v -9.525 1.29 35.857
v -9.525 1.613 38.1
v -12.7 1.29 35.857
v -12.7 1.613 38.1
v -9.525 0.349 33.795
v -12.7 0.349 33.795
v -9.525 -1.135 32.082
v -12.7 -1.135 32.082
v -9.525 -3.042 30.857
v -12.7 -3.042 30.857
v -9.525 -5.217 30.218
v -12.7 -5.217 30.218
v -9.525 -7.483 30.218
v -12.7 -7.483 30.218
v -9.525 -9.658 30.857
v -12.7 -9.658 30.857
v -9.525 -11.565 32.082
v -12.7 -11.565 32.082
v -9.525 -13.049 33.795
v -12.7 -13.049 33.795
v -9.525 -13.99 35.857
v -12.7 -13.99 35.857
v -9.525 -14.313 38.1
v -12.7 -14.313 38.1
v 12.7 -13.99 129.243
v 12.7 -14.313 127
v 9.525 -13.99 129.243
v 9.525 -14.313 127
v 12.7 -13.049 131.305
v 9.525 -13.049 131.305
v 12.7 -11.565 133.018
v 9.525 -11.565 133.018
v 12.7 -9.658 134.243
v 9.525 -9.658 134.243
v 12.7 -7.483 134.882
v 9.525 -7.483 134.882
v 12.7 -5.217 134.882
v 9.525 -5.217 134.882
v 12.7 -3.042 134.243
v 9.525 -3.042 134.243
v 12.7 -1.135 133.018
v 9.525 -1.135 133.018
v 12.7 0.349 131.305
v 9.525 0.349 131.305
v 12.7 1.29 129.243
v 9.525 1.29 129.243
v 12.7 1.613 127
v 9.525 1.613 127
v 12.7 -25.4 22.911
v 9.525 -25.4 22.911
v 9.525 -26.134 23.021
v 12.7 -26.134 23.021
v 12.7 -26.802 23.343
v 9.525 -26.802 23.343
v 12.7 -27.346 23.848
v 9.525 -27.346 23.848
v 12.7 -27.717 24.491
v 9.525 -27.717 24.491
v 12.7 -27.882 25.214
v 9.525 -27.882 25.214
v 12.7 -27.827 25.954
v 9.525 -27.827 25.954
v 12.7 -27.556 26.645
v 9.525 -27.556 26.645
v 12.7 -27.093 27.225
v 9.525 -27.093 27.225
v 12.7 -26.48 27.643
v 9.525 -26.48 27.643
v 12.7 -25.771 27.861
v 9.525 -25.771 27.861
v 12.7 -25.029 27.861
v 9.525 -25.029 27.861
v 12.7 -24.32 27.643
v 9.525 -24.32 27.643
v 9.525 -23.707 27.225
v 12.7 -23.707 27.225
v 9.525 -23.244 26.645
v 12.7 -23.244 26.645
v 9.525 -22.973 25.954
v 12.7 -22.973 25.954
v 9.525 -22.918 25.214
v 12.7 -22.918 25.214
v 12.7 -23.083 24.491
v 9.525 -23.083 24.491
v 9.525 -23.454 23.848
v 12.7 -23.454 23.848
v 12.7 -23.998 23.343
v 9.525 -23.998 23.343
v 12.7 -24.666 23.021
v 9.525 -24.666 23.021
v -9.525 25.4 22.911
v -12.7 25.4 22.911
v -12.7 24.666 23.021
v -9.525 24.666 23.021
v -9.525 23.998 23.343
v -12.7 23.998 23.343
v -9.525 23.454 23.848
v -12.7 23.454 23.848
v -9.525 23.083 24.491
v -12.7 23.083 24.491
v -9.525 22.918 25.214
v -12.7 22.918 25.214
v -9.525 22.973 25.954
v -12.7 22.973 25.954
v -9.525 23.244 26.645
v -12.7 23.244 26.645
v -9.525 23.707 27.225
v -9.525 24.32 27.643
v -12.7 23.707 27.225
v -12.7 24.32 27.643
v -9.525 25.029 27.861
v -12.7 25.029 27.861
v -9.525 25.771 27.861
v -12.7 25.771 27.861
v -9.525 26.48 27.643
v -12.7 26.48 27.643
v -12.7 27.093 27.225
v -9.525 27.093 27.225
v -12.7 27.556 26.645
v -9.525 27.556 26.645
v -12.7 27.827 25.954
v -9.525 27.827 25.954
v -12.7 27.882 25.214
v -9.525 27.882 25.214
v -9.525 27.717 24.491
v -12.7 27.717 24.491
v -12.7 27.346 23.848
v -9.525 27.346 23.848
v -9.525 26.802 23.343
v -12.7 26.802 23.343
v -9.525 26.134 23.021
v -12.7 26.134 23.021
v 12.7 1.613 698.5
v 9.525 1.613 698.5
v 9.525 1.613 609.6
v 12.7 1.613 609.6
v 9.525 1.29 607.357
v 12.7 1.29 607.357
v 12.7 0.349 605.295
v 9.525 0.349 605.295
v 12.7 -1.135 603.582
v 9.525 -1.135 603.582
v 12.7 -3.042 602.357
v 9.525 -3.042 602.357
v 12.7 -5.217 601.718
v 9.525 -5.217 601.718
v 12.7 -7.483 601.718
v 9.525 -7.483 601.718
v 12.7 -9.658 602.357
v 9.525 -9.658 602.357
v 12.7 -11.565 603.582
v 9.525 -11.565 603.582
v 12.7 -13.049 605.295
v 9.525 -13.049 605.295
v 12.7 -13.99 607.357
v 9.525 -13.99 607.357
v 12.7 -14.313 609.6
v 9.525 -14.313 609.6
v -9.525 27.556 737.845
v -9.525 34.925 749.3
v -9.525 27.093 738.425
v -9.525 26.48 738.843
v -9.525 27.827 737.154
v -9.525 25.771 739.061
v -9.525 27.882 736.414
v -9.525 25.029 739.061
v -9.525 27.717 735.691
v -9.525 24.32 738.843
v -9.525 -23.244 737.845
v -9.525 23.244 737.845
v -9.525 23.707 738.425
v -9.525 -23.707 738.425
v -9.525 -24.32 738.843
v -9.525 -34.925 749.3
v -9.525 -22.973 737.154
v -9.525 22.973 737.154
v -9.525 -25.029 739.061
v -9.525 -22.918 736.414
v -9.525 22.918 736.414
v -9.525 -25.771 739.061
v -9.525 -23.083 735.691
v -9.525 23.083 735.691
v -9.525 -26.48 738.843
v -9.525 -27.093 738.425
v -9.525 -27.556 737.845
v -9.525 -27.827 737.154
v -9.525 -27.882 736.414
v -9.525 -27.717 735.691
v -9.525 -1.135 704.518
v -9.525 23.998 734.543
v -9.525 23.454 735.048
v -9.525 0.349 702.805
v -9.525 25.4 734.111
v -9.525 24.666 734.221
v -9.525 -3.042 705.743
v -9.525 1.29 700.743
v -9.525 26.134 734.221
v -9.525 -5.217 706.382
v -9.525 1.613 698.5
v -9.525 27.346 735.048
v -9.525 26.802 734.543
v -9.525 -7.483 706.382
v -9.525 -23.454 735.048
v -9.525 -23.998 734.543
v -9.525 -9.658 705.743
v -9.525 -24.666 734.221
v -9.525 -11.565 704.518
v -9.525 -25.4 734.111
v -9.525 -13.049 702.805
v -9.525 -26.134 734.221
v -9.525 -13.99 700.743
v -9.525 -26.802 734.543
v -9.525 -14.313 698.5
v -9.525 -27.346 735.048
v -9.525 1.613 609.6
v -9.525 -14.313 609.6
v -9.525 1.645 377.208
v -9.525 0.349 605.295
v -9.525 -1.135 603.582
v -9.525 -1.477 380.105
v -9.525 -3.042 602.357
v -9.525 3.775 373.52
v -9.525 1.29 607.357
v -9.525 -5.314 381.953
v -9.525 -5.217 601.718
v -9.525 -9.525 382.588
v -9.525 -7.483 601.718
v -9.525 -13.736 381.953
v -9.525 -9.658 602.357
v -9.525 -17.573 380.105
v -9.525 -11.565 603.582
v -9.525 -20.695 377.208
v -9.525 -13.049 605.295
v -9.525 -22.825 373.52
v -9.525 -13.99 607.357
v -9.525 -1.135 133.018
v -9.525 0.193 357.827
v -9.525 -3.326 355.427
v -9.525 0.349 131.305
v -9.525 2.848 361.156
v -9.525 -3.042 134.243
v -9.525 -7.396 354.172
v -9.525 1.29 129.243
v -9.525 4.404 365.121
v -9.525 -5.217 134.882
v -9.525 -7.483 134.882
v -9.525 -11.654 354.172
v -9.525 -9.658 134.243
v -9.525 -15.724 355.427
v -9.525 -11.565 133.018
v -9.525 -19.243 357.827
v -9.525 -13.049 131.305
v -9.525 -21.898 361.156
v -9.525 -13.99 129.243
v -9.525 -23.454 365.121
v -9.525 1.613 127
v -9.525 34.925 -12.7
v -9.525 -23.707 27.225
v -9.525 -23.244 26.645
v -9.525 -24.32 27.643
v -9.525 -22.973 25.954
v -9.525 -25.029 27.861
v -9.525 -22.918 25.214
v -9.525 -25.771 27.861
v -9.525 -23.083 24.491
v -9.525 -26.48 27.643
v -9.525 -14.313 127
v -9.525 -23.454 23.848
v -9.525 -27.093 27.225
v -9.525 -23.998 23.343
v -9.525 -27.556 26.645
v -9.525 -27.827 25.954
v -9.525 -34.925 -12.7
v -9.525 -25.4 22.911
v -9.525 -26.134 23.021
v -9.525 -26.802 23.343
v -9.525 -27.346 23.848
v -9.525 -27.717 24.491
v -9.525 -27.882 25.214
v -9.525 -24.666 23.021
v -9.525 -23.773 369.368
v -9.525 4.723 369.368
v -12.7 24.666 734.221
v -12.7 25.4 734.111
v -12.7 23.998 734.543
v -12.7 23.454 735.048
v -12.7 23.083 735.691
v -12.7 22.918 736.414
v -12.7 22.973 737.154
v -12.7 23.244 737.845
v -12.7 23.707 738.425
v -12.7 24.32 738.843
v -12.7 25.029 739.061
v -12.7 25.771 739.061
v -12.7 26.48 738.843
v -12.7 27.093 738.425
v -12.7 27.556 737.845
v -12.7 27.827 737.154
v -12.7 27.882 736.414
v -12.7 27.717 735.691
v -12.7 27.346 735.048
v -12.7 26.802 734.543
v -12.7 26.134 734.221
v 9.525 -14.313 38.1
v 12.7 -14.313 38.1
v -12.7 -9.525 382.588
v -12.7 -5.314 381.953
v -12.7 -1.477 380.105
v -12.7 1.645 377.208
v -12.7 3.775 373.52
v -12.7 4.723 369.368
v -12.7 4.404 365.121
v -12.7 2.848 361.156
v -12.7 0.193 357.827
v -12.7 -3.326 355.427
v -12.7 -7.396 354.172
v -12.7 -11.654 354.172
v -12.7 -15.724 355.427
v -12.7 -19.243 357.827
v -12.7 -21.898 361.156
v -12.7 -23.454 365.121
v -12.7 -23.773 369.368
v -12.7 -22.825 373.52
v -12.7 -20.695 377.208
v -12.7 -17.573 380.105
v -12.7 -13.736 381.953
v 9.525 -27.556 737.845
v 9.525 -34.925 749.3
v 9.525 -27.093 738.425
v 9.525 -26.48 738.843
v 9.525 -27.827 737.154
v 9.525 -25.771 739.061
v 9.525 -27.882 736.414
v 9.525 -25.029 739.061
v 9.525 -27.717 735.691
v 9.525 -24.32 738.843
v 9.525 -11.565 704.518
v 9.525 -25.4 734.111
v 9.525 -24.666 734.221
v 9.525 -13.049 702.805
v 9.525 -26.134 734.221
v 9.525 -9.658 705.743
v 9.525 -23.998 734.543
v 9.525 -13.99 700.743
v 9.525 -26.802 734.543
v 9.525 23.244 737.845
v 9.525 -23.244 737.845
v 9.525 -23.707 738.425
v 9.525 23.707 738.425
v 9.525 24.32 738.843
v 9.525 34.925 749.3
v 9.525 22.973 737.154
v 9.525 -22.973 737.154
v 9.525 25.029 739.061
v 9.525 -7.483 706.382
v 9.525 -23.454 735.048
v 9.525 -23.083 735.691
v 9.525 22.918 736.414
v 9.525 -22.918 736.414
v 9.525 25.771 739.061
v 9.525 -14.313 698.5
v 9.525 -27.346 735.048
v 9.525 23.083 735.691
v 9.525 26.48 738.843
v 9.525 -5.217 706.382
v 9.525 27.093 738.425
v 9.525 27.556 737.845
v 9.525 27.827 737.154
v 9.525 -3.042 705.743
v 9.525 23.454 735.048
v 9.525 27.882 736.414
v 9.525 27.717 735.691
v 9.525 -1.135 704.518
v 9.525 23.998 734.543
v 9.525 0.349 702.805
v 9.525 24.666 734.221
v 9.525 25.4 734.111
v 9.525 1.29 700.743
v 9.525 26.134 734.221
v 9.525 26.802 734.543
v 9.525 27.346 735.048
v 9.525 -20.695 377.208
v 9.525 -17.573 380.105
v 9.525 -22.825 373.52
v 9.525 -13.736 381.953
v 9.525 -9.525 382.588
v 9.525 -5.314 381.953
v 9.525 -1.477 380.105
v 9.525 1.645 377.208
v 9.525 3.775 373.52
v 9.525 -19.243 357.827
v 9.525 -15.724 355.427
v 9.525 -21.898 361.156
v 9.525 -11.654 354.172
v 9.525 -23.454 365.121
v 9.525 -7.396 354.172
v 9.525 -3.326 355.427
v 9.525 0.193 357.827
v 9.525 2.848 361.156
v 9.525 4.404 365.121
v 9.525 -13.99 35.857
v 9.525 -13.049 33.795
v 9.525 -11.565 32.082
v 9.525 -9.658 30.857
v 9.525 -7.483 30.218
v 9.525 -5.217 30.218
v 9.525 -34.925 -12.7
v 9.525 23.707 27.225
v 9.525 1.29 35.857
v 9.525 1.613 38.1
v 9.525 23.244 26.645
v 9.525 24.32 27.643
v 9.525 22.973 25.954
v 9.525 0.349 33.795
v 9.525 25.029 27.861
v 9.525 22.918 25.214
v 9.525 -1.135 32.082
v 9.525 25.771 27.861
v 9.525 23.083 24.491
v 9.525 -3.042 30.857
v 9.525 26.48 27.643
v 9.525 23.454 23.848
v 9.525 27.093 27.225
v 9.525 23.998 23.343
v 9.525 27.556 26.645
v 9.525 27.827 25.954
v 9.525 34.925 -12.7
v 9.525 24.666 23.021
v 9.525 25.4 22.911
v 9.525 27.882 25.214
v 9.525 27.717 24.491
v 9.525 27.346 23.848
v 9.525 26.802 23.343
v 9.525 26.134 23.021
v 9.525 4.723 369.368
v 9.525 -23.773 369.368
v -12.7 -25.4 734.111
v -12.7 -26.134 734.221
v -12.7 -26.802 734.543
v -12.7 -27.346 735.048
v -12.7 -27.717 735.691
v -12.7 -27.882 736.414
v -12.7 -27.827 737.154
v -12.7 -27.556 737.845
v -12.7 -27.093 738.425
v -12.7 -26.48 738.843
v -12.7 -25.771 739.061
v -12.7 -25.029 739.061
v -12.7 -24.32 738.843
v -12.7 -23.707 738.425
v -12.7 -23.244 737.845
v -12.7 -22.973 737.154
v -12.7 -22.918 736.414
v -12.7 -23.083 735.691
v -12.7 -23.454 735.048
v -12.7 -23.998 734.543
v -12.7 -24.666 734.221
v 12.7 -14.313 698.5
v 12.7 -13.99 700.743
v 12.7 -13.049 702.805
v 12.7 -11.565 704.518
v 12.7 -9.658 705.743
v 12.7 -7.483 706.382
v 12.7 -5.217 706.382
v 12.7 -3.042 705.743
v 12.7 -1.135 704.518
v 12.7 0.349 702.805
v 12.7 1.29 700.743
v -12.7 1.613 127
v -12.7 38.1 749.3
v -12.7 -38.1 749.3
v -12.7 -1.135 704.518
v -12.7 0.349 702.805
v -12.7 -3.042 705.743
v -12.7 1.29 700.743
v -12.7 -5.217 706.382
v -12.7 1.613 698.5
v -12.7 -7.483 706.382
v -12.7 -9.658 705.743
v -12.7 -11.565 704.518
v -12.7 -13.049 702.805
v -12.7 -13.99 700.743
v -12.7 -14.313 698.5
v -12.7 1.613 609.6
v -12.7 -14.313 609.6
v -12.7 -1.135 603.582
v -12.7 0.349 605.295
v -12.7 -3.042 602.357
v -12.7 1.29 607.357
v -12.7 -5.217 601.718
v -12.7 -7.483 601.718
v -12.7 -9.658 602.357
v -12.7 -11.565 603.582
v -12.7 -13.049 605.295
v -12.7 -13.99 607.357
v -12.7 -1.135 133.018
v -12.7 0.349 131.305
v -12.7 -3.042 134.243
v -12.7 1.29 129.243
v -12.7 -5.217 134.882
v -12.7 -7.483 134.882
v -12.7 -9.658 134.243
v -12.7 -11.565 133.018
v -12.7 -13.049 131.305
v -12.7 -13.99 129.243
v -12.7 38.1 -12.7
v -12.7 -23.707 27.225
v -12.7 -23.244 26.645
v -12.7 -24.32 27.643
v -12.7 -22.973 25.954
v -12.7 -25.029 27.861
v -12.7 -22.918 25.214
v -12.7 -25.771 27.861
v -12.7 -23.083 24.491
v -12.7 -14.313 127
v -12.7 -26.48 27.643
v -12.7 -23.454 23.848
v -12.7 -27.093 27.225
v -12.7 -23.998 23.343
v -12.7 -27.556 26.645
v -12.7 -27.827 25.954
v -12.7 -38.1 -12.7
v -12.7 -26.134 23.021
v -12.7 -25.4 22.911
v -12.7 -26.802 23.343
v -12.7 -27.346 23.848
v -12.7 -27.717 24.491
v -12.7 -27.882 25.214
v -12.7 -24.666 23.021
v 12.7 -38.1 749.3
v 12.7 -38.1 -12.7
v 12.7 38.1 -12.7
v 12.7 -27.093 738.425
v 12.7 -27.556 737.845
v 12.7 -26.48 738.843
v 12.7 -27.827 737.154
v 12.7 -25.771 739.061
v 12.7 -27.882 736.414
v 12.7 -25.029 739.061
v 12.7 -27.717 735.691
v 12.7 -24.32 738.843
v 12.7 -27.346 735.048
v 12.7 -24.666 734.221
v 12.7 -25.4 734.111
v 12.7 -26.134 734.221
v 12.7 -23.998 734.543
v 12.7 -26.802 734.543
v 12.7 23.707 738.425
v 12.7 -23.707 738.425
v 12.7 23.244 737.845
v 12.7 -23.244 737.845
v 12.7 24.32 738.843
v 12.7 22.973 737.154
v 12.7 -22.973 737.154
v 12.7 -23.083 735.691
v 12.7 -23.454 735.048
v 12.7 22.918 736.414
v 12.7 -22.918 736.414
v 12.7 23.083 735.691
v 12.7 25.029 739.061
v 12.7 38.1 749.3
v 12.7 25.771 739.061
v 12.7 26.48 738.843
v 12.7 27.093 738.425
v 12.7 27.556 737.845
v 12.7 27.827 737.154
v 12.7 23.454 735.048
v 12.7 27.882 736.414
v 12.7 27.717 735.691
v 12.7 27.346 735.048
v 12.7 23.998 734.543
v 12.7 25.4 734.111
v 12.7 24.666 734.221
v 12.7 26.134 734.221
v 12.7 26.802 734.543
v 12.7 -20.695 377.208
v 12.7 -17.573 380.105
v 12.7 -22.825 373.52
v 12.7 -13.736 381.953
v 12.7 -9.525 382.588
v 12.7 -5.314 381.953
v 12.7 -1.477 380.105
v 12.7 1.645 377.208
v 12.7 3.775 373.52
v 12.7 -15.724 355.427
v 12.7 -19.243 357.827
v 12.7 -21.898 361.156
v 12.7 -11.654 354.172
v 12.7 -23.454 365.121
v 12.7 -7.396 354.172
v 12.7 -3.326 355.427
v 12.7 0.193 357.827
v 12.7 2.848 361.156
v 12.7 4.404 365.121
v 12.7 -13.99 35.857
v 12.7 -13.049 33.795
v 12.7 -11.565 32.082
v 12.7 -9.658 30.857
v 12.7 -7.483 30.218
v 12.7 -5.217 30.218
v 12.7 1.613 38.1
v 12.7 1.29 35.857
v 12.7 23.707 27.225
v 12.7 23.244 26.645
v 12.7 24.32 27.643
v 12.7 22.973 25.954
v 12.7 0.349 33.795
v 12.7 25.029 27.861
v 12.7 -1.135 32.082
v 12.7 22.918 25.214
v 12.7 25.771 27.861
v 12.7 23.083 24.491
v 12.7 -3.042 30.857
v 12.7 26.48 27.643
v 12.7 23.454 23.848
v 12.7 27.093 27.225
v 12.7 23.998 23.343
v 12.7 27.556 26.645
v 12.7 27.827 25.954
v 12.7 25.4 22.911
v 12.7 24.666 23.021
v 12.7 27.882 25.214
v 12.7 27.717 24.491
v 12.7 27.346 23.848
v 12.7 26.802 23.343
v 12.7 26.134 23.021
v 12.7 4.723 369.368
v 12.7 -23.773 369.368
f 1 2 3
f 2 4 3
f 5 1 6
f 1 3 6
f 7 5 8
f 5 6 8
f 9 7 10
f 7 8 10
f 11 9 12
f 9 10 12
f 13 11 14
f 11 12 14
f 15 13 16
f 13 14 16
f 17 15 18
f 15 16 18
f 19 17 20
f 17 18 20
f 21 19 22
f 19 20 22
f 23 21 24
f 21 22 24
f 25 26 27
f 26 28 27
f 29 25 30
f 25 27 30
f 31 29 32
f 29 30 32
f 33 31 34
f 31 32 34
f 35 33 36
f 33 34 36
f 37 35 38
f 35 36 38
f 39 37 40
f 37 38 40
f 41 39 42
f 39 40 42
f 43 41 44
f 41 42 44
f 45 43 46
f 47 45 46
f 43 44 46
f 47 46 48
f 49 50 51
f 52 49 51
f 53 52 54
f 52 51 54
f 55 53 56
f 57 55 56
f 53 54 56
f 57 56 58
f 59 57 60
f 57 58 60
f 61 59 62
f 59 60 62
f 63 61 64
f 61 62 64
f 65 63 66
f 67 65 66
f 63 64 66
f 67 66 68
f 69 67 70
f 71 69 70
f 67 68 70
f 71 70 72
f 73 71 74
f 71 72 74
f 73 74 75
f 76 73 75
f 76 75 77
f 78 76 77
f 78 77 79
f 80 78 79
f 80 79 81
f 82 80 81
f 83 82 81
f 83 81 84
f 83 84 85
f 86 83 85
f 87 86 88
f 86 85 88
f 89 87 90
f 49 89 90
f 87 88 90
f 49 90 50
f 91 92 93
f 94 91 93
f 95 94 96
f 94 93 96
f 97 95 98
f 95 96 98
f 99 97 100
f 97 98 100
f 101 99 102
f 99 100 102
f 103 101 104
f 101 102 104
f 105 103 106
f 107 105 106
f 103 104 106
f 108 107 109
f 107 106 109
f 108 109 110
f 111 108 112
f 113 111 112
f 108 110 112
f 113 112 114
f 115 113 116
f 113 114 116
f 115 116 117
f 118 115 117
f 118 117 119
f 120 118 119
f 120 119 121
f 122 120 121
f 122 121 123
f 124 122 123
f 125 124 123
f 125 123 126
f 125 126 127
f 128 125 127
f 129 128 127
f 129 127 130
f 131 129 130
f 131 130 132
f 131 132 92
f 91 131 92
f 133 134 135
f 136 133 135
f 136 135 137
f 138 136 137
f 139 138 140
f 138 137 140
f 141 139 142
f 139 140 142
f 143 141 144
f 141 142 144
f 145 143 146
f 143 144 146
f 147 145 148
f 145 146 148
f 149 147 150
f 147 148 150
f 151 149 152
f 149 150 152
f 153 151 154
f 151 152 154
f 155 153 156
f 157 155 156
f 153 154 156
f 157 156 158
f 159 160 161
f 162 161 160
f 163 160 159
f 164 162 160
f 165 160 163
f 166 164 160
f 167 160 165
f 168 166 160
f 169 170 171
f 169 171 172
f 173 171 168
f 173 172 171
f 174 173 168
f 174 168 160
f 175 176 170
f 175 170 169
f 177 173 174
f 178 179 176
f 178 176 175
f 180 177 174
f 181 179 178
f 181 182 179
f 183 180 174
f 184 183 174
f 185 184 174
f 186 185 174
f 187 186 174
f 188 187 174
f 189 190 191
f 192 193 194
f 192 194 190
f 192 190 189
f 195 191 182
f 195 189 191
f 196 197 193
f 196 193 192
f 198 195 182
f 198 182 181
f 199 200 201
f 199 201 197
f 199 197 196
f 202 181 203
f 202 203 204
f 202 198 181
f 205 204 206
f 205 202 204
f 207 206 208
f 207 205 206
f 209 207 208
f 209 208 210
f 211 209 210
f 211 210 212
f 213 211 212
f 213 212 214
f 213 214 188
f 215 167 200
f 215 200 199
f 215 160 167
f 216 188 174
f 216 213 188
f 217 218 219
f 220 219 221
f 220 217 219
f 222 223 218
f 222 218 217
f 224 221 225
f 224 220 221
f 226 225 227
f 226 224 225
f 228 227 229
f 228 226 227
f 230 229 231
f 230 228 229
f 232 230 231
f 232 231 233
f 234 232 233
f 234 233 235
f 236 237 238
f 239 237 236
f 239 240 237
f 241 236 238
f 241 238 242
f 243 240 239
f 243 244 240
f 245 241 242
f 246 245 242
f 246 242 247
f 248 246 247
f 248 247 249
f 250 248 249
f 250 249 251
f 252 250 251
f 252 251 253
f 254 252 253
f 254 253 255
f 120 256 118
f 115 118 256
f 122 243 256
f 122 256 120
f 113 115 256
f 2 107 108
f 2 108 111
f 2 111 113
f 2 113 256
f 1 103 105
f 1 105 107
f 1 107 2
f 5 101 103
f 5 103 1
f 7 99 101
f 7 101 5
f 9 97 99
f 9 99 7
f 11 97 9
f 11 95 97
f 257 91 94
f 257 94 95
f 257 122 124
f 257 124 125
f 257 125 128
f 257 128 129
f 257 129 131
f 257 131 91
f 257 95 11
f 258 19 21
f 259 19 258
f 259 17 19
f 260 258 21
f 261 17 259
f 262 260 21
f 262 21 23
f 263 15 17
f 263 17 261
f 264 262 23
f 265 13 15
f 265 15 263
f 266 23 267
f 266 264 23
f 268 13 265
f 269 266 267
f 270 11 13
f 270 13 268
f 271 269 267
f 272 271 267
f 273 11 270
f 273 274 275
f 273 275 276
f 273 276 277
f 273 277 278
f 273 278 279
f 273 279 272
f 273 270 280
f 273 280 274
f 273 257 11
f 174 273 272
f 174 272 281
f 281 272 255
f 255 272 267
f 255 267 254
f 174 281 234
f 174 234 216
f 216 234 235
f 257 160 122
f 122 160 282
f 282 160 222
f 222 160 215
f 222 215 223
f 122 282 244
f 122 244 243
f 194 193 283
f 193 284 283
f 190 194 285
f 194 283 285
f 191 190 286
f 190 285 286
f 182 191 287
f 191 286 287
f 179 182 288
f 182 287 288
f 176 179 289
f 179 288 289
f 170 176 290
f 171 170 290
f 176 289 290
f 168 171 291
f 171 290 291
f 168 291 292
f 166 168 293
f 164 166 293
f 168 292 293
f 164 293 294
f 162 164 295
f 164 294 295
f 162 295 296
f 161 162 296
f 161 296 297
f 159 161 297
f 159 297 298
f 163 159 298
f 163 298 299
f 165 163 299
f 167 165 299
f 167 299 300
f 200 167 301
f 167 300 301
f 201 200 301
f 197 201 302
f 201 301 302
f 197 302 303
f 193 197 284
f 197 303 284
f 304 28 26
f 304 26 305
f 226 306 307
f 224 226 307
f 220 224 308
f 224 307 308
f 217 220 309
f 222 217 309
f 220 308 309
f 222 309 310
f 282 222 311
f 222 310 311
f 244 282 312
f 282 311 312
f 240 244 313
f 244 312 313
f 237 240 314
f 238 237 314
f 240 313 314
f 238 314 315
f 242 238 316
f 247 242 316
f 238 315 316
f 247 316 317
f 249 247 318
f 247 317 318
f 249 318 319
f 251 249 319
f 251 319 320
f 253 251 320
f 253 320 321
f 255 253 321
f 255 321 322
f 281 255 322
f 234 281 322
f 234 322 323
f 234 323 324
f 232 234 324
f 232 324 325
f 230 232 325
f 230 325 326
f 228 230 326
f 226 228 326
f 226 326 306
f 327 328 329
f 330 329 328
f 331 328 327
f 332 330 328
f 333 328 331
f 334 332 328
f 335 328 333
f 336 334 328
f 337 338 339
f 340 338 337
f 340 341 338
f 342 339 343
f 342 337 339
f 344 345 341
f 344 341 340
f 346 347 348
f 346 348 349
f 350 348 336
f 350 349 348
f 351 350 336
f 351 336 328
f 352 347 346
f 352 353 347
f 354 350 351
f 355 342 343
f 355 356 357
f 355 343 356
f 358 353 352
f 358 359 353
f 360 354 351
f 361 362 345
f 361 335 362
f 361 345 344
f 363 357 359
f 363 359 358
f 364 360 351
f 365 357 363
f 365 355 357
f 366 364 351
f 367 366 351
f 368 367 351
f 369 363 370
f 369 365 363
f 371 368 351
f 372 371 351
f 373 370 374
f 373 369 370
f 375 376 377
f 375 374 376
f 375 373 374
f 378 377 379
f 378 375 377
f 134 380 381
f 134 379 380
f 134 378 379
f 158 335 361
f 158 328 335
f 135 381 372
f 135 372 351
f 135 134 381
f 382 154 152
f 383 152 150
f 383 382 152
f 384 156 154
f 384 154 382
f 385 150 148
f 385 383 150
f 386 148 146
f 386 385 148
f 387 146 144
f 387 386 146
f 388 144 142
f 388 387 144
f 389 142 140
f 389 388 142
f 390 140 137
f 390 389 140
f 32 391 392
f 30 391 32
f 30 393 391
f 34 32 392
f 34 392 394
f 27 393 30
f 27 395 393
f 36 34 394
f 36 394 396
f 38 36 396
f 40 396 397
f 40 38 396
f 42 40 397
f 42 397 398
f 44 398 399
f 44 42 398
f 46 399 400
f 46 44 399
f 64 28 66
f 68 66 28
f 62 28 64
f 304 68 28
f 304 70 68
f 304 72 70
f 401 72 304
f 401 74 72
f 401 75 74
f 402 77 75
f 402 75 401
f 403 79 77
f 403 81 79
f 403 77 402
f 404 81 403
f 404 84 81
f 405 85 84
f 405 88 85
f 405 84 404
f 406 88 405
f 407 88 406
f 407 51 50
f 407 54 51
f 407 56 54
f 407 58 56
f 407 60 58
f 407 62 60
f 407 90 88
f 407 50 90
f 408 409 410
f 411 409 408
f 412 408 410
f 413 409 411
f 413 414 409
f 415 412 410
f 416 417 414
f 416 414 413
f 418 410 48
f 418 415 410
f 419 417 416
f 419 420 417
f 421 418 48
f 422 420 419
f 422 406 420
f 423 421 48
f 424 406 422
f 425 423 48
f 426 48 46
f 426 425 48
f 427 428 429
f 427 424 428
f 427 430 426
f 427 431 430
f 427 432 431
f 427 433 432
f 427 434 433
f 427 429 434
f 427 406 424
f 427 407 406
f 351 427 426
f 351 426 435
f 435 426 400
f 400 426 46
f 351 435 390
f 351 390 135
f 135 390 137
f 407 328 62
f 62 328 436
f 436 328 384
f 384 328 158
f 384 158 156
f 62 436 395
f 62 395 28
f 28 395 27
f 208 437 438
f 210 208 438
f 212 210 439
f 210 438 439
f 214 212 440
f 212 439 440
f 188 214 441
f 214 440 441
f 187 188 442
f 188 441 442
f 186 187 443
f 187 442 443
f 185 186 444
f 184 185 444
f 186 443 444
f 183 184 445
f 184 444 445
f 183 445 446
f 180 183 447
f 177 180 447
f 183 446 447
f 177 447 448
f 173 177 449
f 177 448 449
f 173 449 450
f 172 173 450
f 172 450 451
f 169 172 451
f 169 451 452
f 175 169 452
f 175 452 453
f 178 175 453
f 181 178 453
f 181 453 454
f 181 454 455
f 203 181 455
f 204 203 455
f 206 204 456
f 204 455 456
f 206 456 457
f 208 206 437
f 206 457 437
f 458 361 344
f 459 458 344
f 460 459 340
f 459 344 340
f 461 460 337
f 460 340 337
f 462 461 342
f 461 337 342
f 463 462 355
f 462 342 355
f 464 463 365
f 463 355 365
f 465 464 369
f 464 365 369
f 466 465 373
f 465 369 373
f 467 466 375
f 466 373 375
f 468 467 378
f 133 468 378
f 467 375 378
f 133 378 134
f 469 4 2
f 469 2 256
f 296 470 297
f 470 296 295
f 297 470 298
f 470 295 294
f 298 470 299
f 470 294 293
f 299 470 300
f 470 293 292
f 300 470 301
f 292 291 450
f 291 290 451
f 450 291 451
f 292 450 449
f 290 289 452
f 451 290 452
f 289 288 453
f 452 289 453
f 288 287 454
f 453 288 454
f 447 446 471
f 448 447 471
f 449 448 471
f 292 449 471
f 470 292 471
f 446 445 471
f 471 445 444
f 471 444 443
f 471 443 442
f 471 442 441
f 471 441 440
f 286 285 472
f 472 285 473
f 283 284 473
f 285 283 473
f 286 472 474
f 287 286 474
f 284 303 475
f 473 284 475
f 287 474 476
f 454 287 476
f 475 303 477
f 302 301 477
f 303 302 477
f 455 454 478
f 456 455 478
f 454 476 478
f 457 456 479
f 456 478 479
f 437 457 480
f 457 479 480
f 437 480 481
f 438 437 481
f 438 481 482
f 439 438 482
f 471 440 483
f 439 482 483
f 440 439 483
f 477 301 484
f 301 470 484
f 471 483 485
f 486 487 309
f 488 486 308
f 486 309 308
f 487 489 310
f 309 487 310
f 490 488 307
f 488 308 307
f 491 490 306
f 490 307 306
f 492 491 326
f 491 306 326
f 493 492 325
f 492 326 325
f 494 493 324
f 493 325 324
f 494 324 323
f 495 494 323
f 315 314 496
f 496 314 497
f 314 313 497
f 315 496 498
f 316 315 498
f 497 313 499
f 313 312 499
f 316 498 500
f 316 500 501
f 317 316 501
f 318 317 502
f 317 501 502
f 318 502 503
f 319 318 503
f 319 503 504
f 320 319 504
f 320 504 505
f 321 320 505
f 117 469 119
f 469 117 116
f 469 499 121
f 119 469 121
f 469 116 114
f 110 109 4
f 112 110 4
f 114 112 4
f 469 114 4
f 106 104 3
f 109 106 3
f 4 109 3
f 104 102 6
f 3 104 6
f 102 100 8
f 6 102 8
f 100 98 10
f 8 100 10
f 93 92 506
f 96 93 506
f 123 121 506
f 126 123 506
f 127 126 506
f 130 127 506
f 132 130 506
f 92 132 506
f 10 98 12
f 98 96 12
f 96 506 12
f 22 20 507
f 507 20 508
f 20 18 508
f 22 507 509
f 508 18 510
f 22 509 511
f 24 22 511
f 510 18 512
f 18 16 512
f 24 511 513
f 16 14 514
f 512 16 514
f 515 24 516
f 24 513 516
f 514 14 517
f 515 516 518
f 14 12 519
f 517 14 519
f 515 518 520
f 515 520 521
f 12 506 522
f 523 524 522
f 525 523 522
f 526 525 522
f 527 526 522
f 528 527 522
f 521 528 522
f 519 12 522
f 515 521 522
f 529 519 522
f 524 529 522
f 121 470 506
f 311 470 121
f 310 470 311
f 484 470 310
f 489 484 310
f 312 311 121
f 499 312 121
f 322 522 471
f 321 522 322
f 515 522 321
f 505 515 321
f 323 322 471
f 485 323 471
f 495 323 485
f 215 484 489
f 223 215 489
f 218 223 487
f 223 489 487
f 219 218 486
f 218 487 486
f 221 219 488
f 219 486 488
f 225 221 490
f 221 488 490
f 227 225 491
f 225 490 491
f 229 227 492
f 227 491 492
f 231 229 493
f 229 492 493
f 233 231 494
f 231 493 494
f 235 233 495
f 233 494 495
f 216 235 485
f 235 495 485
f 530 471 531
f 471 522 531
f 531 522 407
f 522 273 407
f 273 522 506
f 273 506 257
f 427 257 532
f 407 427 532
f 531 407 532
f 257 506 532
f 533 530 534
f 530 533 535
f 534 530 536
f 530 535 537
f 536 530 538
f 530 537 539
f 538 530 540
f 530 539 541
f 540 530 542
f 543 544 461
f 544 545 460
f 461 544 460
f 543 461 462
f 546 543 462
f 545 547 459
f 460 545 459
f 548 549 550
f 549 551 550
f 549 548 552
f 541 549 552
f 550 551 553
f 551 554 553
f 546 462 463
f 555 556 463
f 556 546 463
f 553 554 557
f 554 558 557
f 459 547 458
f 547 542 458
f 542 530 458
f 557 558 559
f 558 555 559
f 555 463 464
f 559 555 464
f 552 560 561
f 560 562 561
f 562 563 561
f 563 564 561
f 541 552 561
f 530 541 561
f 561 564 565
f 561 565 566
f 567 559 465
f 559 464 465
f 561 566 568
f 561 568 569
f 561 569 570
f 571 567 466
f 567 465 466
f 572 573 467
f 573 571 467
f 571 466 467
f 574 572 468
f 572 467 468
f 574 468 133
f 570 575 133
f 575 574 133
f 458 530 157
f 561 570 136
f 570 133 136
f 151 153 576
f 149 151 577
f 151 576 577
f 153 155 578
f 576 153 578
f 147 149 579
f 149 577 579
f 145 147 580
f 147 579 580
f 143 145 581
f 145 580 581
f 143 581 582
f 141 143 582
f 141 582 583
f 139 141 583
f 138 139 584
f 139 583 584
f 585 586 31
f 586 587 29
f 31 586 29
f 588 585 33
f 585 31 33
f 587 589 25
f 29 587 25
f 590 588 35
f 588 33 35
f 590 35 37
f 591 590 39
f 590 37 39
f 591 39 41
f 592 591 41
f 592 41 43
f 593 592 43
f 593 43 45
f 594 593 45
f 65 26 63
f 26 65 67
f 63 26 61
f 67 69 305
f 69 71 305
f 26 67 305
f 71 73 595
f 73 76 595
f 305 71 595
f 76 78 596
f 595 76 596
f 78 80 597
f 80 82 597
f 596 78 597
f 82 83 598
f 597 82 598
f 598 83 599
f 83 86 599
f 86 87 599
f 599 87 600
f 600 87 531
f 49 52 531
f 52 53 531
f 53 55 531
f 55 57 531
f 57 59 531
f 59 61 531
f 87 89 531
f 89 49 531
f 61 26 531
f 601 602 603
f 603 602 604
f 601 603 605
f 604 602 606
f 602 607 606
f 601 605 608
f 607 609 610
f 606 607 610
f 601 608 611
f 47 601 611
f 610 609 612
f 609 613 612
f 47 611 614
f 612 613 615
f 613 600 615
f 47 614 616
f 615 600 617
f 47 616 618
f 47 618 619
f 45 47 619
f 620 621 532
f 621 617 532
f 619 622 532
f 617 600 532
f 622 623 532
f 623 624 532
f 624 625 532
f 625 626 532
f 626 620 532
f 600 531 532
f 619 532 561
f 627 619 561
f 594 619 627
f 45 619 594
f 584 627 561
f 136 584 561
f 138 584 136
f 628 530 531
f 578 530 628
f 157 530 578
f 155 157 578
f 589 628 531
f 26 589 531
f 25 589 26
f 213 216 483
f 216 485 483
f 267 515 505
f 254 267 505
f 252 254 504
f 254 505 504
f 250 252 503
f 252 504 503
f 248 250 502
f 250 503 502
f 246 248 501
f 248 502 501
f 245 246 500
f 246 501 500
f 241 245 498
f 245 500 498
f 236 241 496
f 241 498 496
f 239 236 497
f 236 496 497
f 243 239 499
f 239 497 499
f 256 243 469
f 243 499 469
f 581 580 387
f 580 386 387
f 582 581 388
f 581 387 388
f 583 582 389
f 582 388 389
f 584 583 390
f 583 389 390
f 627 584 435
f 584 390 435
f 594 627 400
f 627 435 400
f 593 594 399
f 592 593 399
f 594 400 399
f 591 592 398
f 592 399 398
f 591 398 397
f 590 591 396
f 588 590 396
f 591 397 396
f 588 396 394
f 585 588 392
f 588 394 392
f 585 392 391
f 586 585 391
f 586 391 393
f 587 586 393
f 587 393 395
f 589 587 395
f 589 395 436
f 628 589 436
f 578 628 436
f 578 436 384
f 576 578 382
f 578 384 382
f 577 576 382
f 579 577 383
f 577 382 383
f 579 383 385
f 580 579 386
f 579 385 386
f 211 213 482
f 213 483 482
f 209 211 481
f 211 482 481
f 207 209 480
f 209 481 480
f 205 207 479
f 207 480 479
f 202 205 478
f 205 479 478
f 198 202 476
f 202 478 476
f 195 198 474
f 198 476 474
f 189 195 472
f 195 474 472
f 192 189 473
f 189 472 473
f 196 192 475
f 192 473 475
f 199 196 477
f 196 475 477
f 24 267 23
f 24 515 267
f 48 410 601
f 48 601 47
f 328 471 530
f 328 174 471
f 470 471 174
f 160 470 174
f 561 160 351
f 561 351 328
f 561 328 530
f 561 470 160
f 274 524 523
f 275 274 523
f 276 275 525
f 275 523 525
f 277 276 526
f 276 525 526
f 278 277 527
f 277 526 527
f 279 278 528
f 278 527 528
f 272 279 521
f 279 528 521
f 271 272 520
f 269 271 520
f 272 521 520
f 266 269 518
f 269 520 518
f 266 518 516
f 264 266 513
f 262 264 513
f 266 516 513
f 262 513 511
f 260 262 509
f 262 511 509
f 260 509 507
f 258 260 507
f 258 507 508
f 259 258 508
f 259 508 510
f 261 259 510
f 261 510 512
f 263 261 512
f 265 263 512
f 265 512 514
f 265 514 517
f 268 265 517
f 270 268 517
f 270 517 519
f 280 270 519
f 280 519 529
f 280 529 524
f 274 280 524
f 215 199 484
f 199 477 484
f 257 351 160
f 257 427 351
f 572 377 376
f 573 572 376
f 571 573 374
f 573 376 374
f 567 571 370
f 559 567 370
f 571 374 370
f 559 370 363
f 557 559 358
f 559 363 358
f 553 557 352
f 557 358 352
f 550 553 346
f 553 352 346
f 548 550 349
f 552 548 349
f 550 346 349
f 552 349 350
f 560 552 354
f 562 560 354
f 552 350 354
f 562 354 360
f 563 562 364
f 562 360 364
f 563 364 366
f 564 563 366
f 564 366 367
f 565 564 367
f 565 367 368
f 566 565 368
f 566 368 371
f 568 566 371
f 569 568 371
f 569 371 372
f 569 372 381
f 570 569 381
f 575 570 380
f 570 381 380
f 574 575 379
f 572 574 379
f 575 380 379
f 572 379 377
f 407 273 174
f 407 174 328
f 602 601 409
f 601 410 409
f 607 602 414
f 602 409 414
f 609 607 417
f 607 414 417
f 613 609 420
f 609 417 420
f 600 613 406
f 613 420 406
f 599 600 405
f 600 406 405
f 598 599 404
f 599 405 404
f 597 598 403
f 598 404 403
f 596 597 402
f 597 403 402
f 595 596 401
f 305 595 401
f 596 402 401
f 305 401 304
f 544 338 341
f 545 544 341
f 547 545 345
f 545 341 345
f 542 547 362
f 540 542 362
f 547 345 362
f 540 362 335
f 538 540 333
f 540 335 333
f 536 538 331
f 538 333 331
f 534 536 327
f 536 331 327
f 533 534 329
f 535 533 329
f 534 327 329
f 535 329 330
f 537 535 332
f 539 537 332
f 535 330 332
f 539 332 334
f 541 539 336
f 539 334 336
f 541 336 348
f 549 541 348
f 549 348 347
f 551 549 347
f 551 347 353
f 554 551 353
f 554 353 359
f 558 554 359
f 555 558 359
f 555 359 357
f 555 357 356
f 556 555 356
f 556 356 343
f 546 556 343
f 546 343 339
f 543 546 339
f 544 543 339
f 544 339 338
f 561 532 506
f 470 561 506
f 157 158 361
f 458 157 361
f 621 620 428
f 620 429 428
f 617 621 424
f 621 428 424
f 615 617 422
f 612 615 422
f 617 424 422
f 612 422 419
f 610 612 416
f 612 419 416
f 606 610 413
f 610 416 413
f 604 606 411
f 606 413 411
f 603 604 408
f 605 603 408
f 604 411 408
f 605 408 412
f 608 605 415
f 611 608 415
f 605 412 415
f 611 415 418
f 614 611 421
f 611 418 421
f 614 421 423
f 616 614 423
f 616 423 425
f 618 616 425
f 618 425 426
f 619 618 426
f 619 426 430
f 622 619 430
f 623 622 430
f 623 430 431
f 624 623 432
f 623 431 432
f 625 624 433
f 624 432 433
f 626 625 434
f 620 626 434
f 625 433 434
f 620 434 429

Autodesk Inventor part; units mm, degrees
ref_plane "Start Plane" through (0, 0, -12.7) normal (0, 0, 1) x (1, 0, 0)
ref_plane "End Plane" through (0, 0, 749.3) normal (0, 0, 1) x (1, 0, 0)
sketch "Sketch" plane through (0, 0, 0) normal (0, 0, 1) x (1, 0, 0)
  line L0 (-12.7, -38.1) -> (12.7, -38.1)
  line L1 (12.7, -38.1) -> (12.7, 38.1)
  line L2 (12.7, 38.1) -> (-12.7, 38.1)
  line L3 (-12.7, 38.1) -> (-12.7, -38.1)
  line L4 (-12.7, -38.1) -> (12.7, 38.1) construction
  line L5 (12.7, -38.1) -> (-12.7, 38.1) construction
  line L6 (-9.525, -34.925) -> (9.525, -34.925)
  line L7 (9.525, -34.925) -> (9.525, 34.925)
  line L8 (9.525, 34.925) -> (-9.525, 34.925)
  line L9 (-9.525, 34.925) -> (-9.525, -34.925)
  line L10 (-9.525, -34.925) -> (9.525, 34.925) construction
  line L11 (9.525, -34.925) -> (-9.525, 34.925) construction
  point P0 (0, 0)
  dimension "d0" = 25.4
  dimension "d1" = 76.2
  dimension "d2" = 3.175
  dimension "d3" = 3.175
extrude "Body" add sketch "Sketch" along normal up to surface (762 mm away) from surface at -12.7
sketch "Sketch6" plane through (0, 0, 0) normal (0, 0, 1) x (1, 0, 0)
  line L0 (0, 0) -> (10, 0)
ref_plane "Work Plane5" through (0, 0, 0) normal (0, -1, 0) x (1, 0, 0)
sketch "Sketch7" plane through (0, 0, 0) normal (0, -1, 0) x (1, 0, 0)
  line L0 (-2, -12.7) -> (12, -12.7)
  line L1 (-2, 749.3) -> (12, 749.3)
  dimension "d11" = 762
ref_plane "Work Plane6" through (609.6, 0, -12.7) normal (0, 0, -1) x (-1, 0, 0)
split "Split1" plane through (609.6, 0, -12.7) removes the side toward (0, 0, -1)
ref_plane "Work Plane7" through (0, 38.1, 749.3) normal (0, 0, 1) x (1, 0, 0)
split "Split2" plane through (0, 38.1, 749.3) removes the side toward (0, 0, 1)
sketch "Sketch8" plane through (-12.7, -38.1, 749.3) normal (-1, 0, 0) x (0, 0, 1)
  circle A0 centre (-381, 28.575) radius 14.2875
  line L0 (-762, 0) -> (0, 0) projected
  line L1 (-762, 76.2) -> (-762, 0) projected
  line L2 (0, 76.2) -> (-762, 76.2) projected
  line L3 (-622.3, 31.75) -> (-711.2, 31.75) construction
  line L4 (-622.3, 23.7871) -> (-711.2, 23.7871)
  line L5 (-711.2, 39.7129) -> (-622.3, 39.7129)
  arc A1 (-622.3, 23.7871) -> (-622.3, 39.7129) centre (-622.3, 31.75) ccw
  arc A2 (-711.2, 39.7129) -> (-711.2, 23.7871) centre (-711.2, 31.75) ccw
  line L6 (-139.7, 31.75) -> (-50.8, 31.75) construction
  line L7 (-139.7, 23.7871) -> (-50.8, 23.7871)
  line L8 (-50.8, 39.7129) -> (-139.7, 39.7129)
  arc A3 (-139.7, 39.7129) -> (-139.7, 23.7871) centre (-139.7, 31.75) ccw
  arc A4 (-50.8, 23.7871) -> (-50.8, 39.7129) centre (-50.8, 31.75) ccw
  line L9 (0, 0) -> (0, 76.2) projected
  line L10 (-381, 76.2) -> (-381, 0) construction
  line L11 (-762, 0) -> (0, 0) construction
  point P0 (-762, 73.025)
  point P1 (-666.75, 31.75)
  point P2 (-95.25, 31.75)
  dimension "d16" = 28.575
  dimension "d44" = 7.9629
  dimension "d45" = 7.9629
  dimension "d46" = 88.9
  dimension "d47" = 88.9
  dimension "d48" = 50.8
  dimension "d49" = 50.8
  dimension "d50" = 31.75
  dimension "d51" = 31.75
  dimension "d52" = 28.575
extrude "Extrusion3" cut sketch "Sketch8" against normal blind 25.4 contours A0 | L4 A2 L5 A1 | A3 L8 A4 L7
sketch "Sketch9" plane through (12.7, -38.1, 749.3) normal (1, 0, 0) x (0, 0, -1)
  line L0 (762, 76.2) -> (0, 76.2) projected
  line L1 (0, 76.2) -> (0, 0) projected
  point P0 (749.3, 38.1)
  point P1 (12.7, 63.5)
  point P2 (723.9, 63.5)
  point P3 (12.7, 12.7)
  point P4 (723.9, 12.7)
  dimension "d21" = 12.7
  dimension "d22" = 12.7
  dimension "d25" = 711.2
  dimension "d28" = 50.8
hole "Hole1" at (12.7, 25.4, 736.6) at (12.7, 25.4, 25.4) at (12.7, -25.4, 736.6) at (12.7, -25.4, 25.4) direction (-1, 0, 0) diameter 4.9784 end through all clearance for "Flat Head Machine Screw (82)" size "#10" standard "Ansi Unified Screw Threads"
equation "\"d0\" = Width"
equation "\"d1\" = Height"
equation "\"d2\" = Thickness"
equation "\"d3\" = Thickness"
equation "\"d45\" = d44"
equation "\"d47\" = d46"
equation "\"d49\" = d48"
equation "\"d51\" = d50"
equation "\"Height\" = 76.2"
equation "\"Width\" = 25.4"
equation "\"Thickness\" = 3.175"
equation "\"BaseLength\" = 736.6"
equation "\"G_OFFSET_START\" = 12.7"
equation "\"G_OFFSET_END\" = 12.7"
equation "\"d6\" = -G_OFFSET_START"
equation "\"d7\" = BaseLength + G_OFFSET_END"
equation "\"G_L\" = d11"
properties part number "AL RECT TUBE 3 x 1 x 0.125" material "Aluminum 6061"
